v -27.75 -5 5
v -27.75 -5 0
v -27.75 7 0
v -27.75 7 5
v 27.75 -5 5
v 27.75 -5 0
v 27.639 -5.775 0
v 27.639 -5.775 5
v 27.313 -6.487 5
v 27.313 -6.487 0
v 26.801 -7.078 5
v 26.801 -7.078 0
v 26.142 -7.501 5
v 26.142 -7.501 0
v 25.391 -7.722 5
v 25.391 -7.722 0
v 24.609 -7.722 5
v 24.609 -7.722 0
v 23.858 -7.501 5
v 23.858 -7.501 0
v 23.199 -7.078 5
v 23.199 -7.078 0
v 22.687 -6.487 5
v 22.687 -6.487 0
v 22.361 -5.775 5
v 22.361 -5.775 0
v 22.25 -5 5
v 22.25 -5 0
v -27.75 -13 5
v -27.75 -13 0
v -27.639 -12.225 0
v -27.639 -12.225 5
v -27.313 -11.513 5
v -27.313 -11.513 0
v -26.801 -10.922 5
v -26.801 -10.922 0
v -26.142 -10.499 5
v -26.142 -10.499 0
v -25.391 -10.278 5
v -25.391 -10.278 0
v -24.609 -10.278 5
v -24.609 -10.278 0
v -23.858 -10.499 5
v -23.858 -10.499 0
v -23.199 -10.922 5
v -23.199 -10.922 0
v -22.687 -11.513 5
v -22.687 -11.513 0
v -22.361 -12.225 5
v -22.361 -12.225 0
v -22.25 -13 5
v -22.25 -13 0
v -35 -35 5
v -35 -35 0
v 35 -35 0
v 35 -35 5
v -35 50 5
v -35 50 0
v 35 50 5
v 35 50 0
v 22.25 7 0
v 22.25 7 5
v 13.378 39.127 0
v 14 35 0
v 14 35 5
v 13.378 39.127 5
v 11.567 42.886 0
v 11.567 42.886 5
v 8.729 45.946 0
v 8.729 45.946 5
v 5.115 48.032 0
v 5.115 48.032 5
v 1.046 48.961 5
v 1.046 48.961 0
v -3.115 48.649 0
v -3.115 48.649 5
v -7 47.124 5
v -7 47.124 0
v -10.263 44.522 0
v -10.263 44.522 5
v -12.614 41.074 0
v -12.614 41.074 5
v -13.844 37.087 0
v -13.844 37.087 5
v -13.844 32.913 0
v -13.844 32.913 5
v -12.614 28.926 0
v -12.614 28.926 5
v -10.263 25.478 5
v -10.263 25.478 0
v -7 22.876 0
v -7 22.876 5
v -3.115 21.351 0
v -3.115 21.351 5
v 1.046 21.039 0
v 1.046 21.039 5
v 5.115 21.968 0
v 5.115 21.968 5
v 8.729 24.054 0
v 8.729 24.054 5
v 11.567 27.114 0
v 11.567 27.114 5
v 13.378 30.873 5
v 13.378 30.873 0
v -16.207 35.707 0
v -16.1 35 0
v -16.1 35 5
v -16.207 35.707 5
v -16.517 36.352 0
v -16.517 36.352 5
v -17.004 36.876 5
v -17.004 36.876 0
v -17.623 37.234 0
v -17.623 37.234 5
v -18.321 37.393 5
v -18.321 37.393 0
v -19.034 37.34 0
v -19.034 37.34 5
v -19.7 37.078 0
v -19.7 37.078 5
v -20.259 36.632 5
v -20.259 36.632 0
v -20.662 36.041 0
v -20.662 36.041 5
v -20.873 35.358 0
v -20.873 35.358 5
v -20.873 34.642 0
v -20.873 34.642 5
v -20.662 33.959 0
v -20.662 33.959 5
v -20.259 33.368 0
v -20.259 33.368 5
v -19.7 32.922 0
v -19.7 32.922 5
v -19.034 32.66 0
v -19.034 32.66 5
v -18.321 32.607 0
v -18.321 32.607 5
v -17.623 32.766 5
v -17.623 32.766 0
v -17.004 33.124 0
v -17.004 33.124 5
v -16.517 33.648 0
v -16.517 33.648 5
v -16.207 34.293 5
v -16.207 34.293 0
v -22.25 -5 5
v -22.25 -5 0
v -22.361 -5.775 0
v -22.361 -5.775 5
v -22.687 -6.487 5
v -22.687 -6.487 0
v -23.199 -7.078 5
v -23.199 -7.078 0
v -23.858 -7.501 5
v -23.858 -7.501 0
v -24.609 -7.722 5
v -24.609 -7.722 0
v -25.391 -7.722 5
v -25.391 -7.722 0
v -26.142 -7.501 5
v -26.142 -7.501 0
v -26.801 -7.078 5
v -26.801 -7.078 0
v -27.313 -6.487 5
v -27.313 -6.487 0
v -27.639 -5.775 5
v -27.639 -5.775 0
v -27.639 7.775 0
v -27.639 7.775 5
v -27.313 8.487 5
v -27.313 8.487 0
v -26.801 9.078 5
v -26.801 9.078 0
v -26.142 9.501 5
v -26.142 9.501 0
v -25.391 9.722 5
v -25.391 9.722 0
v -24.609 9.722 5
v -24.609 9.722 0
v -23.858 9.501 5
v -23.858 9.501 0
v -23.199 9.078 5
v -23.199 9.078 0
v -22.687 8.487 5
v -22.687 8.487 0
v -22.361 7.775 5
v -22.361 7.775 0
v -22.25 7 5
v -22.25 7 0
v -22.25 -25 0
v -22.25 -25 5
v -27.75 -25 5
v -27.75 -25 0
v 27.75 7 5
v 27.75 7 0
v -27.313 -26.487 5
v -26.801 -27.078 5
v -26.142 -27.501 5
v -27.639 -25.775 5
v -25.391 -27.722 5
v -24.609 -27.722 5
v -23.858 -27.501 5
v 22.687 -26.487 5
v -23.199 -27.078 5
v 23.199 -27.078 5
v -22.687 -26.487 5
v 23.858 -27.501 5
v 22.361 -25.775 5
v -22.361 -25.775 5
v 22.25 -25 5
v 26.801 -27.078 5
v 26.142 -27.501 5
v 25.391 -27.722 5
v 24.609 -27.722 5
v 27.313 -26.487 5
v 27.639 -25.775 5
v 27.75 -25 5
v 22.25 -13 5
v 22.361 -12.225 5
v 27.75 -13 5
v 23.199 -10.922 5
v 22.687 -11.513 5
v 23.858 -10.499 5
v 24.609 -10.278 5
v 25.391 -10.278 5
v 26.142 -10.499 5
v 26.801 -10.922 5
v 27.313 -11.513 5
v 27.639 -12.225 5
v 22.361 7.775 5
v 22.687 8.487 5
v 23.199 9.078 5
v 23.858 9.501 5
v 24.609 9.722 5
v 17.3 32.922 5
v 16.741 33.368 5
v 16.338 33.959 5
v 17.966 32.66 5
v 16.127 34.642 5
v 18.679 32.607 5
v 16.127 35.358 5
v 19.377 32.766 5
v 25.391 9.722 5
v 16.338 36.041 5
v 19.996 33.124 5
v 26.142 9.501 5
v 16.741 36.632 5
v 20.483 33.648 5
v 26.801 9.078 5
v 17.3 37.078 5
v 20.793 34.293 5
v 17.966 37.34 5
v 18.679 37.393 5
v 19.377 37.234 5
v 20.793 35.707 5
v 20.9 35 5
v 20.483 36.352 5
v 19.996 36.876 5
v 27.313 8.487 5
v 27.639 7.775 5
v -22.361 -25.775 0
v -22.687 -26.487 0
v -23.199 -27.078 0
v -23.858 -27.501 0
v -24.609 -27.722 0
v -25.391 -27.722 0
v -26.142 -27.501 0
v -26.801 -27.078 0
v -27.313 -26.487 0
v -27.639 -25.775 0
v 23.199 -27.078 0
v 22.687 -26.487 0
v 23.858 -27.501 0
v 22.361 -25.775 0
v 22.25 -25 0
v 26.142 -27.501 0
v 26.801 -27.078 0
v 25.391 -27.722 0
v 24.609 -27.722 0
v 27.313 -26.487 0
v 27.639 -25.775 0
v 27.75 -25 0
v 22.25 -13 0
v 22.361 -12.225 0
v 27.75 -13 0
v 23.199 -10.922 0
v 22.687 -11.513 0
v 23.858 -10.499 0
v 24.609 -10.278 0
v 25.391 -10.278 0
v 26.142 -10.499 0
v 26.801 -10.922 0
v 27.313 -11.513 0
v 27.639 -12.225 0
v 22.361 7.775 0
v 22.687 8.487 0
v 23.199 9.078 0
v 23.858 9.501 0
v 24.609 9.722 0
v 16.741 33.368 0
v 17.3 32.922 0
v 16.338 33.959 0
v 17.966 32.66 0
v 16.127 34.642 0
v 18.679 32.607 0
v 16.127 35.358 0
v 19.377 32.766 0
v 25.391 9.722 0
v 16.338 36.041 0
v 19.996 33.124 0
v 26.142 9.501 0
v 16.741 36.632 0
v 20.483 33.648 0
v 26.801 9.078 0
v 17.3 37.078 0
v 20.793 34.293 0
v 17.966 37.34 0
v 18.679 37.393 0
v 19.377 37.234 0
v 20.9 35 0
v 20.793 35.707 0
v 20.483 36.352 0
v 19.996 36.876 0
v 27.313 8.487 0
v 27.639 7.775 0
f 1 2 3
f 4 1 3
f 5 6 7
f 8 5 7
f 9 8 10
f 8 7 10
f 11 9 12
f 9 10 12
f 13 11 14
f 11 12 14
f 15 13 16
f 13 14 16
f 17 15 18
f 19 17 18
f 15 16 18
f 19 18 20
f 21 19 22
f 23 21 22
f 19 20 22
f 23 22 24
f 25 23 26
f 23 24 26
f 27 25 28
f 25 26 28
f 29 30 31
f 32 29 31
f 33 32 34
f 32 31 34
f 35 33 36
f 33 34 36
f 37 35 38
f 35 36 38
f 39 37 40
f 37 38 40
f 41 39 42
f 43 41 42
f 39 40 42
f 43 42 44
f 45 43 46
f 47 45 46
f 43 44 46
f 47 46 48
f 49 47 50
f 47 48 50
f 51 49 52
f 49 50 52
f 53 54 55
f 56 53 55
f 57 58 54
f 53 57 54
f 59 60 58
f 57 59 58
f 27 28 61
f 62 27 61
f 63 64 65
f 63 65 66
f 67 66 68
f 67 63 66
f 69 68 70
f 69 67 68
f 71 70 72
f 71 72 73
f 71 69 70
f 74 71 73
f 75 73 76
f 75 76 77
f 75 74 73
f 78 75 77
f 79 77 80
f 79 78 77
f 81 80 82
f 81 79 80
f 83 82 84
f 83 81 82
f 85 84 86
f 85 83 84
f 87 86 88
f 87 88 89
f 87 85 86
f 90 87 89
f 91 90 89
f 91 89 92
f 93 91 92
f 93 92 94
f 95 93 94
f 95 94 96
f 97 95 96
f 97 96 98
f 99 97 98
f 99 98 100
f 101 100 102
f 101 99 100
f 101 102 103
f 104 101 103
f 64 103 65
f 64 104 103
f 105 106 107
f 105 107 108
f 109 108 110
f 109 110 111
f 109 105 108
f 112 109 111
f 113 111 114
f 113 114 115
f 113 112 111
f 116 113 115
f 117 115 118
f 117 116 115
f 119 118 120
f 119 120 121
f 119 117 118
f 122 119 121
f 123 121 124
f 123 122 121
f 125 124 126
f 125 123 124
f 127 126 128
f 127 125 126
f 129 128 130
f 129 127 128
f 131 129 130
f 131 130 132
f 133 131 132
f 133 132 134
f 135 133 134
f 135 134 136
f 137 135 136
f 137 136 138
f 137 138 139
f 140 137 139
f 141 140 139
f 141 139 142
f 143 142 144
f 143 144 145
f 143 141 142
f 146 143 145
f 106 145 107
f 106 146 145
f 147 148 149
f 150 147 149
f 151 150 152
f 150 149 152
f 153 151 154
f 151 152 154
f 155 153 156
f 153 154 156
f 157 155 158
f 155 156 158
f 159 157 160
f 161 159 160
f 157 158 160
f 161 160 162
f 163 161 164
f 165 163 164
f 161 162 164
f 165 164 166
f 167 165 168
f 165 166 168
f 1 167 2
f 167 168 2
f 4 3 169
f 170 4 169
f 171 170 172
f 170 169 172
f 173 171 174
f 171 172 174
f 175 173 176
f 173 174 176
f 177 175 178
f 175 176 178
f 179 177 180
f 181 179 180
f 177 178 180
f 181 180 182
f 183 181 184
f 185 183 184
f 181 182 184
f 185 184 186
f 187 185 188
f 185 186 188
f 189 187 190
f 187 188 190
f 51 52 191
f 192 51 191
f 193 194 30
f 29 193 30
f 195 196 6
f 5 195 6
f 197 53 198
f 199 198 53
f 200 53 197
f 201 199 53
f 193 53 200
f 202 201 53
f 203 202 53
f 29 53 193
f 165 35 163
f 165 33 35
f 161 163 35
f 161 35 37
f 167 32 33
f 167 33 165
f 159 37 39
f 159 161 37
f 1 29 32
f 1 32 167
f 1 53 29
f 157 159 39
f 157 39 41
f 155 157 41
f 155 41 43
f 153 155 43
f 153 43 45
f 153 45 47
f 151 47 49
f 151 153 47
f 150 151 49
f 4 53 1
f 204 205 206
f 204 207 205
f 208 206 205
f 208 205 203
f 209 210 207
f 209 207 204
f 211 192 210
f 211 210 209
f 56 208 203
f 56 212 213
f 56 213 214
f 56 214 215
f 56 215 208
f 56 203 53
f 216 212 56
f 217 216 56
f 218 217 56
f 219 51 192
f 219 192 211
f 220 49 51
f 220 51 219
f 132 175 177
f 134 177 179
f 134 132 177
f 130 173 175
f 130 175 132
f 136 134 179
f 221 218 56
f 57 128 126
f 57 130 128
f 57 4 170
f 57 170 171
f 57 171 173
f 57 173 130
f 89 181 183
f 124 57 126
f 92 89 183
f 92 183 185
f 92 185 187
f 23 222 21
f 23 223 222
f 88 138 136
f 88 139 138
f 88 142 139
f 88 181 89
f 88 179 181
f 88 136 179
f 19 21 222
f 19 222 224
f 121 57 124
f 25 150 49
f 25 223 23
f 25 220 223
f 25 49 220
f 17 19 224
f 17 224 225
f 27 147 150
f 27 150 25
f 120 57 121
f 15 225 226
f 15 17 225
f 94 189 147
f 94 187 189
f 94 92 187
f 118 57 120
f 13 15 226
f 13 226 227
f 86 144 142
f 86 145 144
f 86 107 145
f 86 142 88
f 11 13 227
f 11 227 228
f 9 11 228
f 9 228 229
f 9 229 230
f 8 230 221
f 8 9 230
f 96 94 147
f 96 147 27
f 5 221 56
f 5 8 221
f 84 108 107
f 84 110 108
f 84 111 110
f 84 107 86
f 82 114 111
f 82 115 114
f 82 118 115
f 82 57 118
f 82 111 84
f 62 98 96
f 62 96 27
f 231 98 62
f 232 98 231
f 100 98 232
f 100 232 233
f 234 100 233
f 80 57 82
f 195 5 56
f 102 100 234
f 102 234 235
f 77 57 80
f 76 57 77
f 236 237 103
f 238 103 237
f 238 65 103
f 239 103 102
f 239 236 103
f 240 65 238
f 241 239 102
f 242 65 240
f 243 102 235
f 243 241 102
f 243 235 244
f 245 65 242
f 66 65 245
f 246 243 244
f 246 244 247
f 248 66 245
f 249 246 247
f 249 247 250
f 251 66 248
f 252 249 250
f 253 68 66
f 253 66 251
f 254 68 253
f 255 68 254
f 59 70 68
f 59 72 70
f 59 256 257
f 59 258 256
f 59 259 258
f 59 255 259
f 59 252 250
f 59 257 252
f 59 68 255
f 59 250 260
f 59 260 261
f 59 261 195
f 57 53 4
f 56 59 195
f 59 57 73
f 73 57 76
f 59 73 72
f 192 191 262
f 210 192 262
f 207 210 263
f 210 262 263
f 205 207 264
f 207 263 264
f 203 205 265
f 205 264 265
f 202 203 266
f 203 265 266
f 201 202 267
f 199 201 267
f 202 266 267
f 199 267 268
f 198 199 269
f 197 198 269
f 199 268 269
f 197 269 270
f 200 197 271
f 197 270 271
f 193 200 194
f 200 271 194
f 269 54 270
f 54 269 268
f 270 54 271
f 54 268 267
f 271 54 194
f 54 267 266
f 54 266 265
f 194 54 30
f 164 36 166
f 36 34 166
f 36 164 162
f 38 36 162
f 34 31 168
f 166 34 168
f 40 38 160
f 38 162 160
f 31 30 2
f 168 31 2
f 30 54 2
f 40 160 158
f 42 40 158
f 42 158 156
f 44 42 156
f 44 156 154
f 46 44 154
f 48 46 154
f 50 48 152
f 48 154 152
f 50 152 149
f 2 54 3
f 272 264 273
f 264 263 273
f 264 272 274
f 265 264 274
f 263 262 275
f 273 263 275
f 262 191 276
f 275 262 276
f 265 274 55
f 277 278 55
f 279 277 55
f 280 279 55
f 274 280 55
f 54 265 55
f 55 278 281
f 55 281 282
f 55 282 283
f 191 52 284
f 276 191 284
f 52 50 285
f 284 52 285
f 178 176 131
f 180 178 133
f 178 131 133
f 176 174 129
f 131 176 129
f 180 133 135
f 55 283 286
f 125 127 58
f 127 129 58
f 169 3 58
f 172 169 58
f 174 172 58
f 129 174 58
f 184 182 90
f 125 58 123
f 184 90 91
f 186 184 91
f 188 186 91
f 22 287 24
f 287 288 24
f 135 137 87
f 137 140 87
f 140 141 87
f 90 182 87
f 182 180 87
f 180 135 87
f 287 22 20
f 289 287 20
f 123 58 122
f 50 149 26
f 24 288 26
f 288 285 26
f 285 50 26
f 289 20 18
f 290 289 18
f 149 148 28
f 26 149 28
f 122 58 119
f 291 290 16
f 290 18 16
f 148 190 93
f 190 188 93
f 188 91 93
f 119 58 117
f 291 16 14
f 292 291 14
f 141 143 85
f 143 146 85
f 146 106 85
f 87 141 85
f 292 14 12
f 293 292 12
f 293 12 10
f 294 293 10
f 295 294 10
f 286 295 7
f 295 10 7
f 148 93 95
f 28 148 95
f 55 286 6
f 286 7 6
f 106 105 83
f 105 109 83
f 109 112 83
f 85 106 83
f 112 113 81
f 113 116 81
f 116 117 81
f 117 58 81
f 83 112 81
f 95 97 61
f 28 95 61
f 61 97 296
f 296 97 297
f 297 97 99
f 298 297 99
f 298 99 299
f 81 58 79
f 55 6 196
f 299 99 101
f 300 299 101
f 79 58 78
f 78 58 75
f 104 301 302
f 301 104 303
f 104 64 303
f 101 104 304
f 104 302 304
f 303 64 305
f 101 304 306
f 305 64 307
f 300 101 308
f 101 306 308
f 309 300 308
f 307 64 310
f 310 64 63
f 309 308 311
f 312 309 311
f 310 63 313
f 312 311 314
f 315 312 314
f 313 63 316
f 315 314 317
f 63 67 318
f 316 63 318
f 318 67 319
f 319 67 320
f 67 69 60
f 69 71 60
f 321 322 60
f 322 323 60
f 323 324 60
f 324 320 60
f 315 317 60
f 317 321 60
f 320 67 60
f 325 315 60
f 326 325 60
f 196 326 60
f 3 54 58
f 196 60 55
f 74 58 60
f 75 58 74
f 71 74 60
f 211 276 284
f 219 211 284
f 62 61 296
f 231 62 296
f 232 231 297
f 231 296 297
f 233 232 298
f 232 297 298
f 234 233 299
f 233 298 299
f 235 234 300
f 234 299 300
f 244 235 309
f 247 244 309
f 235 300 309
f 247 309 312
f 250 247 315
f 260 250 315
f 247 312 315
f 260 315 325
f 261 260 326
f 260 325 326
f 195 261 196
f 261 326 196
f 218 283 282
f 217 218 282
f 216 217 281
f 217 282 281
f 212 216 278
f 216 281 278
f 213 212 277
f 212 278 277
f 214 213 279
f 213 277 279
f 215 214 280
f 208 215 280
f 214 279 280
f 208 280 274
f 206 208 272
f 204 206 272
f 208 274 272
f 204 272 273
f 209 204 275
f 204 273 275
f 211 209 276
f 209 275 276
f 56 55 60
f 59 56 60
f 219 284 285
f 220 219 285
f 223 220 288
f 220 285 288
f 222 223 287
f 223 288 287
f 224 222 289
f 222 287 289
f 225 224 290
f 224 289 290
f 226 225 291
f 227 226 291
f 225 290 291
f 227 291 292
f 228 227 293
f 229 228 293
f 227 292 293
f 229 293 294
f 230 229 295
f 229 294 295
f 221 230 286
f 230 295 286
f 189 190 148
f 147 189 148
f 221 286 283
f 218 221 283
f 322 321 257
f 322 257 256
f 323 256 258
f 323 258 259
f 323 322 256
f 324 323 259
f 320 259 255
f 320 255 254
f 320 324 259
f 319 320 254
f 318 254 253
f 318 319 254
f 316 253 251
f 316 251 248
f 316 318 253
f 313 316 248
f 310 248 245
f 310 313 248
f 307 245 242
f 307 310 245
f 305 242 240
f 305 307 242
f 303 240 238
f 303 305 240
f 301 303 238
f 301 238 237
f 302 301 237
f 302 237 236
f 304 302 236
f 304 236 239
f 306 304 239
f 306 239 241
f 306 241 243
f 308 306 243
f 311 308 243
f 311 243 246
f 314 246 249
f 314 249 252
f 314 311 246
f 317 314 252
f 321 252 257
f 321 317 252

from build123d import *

# Parameters (mm, degrees)
SKETCH1_R           = 2.4
SKETCH1_R_2         = 14
BOSS_EXTRUDE1_DEPTH = 5


with BuildPart() as part:
    # Sketch1 → Boss-Extrude1 (new body)
    with BuildSketch(Plane.XY):
        Polygon((-35, 50), (-35, -15), (-35, -35), (35, -35), (35, -15), (35, 50), align=None)
        with BuildLine():
            ThreePointArc((-22.25, -25), (-25, -27.75), (-27.75, -25))
            Line((-27.75, -25), (-27.75, -13))
            ThreePointArc((-27.75, -13), (-25, -10.25), (-22.25, -13))
            Line((-22.25, -13), (-22.25, -25))
        make_face(mode=Mode.SUBTRACT)
        with BuildLine():
            ThreePointArc((-22.25, -5), (-25, -7.75), (-27.75, -5))
            Line((-27.75, -5), (-27.75, 7))
            ThreePointArc((-27.75, 7), (-25, 9.75), (-22.25, 7))
            Line((-22.25, 7), (-22.25, -5))
        make_face(mode=Mode.SUBTRACT)
        with BuildLine():
            Line((27.75, -13), (27.75, -25))
            ThreePointArc((27.75, -25), (25, -27.75), (22.25, -25))
            Line((22.25, -25), (22.25, -13))
            ThreePointArc((22.25, -13), (25, -10.25), (27.75, -13))
        make_face(mode=Mode.SUBTRACT)
        with BuildLine():
            Line((27.75, 7), (27.75, -5))
            ThreePointArc((27.75, -5), (25, -7.75), (22.25, -5))
            Line((22.25, -5), (22.25, 7))
            ThreePointArc((22.25, 7), (25, 9.75), (27.75, 7))
        make_face(mode=Mode.SUBTRACT)
        with Locations((-18.5, 35)):
            Circle(SKETCH1_R, mode=Mode.SUBTRACT)
        with Locations((0, 35)):
            Circle(SKETCH1_R_2, mode=Mode.SUBTRACT)
        with Locations((18.5, 35)):
            Circle(SKETCH1_R, mode=Mode.SUBTRACT)
    extrude(amount=BOSS_EXTRUDE1_DEPTH)


solid = part.part
